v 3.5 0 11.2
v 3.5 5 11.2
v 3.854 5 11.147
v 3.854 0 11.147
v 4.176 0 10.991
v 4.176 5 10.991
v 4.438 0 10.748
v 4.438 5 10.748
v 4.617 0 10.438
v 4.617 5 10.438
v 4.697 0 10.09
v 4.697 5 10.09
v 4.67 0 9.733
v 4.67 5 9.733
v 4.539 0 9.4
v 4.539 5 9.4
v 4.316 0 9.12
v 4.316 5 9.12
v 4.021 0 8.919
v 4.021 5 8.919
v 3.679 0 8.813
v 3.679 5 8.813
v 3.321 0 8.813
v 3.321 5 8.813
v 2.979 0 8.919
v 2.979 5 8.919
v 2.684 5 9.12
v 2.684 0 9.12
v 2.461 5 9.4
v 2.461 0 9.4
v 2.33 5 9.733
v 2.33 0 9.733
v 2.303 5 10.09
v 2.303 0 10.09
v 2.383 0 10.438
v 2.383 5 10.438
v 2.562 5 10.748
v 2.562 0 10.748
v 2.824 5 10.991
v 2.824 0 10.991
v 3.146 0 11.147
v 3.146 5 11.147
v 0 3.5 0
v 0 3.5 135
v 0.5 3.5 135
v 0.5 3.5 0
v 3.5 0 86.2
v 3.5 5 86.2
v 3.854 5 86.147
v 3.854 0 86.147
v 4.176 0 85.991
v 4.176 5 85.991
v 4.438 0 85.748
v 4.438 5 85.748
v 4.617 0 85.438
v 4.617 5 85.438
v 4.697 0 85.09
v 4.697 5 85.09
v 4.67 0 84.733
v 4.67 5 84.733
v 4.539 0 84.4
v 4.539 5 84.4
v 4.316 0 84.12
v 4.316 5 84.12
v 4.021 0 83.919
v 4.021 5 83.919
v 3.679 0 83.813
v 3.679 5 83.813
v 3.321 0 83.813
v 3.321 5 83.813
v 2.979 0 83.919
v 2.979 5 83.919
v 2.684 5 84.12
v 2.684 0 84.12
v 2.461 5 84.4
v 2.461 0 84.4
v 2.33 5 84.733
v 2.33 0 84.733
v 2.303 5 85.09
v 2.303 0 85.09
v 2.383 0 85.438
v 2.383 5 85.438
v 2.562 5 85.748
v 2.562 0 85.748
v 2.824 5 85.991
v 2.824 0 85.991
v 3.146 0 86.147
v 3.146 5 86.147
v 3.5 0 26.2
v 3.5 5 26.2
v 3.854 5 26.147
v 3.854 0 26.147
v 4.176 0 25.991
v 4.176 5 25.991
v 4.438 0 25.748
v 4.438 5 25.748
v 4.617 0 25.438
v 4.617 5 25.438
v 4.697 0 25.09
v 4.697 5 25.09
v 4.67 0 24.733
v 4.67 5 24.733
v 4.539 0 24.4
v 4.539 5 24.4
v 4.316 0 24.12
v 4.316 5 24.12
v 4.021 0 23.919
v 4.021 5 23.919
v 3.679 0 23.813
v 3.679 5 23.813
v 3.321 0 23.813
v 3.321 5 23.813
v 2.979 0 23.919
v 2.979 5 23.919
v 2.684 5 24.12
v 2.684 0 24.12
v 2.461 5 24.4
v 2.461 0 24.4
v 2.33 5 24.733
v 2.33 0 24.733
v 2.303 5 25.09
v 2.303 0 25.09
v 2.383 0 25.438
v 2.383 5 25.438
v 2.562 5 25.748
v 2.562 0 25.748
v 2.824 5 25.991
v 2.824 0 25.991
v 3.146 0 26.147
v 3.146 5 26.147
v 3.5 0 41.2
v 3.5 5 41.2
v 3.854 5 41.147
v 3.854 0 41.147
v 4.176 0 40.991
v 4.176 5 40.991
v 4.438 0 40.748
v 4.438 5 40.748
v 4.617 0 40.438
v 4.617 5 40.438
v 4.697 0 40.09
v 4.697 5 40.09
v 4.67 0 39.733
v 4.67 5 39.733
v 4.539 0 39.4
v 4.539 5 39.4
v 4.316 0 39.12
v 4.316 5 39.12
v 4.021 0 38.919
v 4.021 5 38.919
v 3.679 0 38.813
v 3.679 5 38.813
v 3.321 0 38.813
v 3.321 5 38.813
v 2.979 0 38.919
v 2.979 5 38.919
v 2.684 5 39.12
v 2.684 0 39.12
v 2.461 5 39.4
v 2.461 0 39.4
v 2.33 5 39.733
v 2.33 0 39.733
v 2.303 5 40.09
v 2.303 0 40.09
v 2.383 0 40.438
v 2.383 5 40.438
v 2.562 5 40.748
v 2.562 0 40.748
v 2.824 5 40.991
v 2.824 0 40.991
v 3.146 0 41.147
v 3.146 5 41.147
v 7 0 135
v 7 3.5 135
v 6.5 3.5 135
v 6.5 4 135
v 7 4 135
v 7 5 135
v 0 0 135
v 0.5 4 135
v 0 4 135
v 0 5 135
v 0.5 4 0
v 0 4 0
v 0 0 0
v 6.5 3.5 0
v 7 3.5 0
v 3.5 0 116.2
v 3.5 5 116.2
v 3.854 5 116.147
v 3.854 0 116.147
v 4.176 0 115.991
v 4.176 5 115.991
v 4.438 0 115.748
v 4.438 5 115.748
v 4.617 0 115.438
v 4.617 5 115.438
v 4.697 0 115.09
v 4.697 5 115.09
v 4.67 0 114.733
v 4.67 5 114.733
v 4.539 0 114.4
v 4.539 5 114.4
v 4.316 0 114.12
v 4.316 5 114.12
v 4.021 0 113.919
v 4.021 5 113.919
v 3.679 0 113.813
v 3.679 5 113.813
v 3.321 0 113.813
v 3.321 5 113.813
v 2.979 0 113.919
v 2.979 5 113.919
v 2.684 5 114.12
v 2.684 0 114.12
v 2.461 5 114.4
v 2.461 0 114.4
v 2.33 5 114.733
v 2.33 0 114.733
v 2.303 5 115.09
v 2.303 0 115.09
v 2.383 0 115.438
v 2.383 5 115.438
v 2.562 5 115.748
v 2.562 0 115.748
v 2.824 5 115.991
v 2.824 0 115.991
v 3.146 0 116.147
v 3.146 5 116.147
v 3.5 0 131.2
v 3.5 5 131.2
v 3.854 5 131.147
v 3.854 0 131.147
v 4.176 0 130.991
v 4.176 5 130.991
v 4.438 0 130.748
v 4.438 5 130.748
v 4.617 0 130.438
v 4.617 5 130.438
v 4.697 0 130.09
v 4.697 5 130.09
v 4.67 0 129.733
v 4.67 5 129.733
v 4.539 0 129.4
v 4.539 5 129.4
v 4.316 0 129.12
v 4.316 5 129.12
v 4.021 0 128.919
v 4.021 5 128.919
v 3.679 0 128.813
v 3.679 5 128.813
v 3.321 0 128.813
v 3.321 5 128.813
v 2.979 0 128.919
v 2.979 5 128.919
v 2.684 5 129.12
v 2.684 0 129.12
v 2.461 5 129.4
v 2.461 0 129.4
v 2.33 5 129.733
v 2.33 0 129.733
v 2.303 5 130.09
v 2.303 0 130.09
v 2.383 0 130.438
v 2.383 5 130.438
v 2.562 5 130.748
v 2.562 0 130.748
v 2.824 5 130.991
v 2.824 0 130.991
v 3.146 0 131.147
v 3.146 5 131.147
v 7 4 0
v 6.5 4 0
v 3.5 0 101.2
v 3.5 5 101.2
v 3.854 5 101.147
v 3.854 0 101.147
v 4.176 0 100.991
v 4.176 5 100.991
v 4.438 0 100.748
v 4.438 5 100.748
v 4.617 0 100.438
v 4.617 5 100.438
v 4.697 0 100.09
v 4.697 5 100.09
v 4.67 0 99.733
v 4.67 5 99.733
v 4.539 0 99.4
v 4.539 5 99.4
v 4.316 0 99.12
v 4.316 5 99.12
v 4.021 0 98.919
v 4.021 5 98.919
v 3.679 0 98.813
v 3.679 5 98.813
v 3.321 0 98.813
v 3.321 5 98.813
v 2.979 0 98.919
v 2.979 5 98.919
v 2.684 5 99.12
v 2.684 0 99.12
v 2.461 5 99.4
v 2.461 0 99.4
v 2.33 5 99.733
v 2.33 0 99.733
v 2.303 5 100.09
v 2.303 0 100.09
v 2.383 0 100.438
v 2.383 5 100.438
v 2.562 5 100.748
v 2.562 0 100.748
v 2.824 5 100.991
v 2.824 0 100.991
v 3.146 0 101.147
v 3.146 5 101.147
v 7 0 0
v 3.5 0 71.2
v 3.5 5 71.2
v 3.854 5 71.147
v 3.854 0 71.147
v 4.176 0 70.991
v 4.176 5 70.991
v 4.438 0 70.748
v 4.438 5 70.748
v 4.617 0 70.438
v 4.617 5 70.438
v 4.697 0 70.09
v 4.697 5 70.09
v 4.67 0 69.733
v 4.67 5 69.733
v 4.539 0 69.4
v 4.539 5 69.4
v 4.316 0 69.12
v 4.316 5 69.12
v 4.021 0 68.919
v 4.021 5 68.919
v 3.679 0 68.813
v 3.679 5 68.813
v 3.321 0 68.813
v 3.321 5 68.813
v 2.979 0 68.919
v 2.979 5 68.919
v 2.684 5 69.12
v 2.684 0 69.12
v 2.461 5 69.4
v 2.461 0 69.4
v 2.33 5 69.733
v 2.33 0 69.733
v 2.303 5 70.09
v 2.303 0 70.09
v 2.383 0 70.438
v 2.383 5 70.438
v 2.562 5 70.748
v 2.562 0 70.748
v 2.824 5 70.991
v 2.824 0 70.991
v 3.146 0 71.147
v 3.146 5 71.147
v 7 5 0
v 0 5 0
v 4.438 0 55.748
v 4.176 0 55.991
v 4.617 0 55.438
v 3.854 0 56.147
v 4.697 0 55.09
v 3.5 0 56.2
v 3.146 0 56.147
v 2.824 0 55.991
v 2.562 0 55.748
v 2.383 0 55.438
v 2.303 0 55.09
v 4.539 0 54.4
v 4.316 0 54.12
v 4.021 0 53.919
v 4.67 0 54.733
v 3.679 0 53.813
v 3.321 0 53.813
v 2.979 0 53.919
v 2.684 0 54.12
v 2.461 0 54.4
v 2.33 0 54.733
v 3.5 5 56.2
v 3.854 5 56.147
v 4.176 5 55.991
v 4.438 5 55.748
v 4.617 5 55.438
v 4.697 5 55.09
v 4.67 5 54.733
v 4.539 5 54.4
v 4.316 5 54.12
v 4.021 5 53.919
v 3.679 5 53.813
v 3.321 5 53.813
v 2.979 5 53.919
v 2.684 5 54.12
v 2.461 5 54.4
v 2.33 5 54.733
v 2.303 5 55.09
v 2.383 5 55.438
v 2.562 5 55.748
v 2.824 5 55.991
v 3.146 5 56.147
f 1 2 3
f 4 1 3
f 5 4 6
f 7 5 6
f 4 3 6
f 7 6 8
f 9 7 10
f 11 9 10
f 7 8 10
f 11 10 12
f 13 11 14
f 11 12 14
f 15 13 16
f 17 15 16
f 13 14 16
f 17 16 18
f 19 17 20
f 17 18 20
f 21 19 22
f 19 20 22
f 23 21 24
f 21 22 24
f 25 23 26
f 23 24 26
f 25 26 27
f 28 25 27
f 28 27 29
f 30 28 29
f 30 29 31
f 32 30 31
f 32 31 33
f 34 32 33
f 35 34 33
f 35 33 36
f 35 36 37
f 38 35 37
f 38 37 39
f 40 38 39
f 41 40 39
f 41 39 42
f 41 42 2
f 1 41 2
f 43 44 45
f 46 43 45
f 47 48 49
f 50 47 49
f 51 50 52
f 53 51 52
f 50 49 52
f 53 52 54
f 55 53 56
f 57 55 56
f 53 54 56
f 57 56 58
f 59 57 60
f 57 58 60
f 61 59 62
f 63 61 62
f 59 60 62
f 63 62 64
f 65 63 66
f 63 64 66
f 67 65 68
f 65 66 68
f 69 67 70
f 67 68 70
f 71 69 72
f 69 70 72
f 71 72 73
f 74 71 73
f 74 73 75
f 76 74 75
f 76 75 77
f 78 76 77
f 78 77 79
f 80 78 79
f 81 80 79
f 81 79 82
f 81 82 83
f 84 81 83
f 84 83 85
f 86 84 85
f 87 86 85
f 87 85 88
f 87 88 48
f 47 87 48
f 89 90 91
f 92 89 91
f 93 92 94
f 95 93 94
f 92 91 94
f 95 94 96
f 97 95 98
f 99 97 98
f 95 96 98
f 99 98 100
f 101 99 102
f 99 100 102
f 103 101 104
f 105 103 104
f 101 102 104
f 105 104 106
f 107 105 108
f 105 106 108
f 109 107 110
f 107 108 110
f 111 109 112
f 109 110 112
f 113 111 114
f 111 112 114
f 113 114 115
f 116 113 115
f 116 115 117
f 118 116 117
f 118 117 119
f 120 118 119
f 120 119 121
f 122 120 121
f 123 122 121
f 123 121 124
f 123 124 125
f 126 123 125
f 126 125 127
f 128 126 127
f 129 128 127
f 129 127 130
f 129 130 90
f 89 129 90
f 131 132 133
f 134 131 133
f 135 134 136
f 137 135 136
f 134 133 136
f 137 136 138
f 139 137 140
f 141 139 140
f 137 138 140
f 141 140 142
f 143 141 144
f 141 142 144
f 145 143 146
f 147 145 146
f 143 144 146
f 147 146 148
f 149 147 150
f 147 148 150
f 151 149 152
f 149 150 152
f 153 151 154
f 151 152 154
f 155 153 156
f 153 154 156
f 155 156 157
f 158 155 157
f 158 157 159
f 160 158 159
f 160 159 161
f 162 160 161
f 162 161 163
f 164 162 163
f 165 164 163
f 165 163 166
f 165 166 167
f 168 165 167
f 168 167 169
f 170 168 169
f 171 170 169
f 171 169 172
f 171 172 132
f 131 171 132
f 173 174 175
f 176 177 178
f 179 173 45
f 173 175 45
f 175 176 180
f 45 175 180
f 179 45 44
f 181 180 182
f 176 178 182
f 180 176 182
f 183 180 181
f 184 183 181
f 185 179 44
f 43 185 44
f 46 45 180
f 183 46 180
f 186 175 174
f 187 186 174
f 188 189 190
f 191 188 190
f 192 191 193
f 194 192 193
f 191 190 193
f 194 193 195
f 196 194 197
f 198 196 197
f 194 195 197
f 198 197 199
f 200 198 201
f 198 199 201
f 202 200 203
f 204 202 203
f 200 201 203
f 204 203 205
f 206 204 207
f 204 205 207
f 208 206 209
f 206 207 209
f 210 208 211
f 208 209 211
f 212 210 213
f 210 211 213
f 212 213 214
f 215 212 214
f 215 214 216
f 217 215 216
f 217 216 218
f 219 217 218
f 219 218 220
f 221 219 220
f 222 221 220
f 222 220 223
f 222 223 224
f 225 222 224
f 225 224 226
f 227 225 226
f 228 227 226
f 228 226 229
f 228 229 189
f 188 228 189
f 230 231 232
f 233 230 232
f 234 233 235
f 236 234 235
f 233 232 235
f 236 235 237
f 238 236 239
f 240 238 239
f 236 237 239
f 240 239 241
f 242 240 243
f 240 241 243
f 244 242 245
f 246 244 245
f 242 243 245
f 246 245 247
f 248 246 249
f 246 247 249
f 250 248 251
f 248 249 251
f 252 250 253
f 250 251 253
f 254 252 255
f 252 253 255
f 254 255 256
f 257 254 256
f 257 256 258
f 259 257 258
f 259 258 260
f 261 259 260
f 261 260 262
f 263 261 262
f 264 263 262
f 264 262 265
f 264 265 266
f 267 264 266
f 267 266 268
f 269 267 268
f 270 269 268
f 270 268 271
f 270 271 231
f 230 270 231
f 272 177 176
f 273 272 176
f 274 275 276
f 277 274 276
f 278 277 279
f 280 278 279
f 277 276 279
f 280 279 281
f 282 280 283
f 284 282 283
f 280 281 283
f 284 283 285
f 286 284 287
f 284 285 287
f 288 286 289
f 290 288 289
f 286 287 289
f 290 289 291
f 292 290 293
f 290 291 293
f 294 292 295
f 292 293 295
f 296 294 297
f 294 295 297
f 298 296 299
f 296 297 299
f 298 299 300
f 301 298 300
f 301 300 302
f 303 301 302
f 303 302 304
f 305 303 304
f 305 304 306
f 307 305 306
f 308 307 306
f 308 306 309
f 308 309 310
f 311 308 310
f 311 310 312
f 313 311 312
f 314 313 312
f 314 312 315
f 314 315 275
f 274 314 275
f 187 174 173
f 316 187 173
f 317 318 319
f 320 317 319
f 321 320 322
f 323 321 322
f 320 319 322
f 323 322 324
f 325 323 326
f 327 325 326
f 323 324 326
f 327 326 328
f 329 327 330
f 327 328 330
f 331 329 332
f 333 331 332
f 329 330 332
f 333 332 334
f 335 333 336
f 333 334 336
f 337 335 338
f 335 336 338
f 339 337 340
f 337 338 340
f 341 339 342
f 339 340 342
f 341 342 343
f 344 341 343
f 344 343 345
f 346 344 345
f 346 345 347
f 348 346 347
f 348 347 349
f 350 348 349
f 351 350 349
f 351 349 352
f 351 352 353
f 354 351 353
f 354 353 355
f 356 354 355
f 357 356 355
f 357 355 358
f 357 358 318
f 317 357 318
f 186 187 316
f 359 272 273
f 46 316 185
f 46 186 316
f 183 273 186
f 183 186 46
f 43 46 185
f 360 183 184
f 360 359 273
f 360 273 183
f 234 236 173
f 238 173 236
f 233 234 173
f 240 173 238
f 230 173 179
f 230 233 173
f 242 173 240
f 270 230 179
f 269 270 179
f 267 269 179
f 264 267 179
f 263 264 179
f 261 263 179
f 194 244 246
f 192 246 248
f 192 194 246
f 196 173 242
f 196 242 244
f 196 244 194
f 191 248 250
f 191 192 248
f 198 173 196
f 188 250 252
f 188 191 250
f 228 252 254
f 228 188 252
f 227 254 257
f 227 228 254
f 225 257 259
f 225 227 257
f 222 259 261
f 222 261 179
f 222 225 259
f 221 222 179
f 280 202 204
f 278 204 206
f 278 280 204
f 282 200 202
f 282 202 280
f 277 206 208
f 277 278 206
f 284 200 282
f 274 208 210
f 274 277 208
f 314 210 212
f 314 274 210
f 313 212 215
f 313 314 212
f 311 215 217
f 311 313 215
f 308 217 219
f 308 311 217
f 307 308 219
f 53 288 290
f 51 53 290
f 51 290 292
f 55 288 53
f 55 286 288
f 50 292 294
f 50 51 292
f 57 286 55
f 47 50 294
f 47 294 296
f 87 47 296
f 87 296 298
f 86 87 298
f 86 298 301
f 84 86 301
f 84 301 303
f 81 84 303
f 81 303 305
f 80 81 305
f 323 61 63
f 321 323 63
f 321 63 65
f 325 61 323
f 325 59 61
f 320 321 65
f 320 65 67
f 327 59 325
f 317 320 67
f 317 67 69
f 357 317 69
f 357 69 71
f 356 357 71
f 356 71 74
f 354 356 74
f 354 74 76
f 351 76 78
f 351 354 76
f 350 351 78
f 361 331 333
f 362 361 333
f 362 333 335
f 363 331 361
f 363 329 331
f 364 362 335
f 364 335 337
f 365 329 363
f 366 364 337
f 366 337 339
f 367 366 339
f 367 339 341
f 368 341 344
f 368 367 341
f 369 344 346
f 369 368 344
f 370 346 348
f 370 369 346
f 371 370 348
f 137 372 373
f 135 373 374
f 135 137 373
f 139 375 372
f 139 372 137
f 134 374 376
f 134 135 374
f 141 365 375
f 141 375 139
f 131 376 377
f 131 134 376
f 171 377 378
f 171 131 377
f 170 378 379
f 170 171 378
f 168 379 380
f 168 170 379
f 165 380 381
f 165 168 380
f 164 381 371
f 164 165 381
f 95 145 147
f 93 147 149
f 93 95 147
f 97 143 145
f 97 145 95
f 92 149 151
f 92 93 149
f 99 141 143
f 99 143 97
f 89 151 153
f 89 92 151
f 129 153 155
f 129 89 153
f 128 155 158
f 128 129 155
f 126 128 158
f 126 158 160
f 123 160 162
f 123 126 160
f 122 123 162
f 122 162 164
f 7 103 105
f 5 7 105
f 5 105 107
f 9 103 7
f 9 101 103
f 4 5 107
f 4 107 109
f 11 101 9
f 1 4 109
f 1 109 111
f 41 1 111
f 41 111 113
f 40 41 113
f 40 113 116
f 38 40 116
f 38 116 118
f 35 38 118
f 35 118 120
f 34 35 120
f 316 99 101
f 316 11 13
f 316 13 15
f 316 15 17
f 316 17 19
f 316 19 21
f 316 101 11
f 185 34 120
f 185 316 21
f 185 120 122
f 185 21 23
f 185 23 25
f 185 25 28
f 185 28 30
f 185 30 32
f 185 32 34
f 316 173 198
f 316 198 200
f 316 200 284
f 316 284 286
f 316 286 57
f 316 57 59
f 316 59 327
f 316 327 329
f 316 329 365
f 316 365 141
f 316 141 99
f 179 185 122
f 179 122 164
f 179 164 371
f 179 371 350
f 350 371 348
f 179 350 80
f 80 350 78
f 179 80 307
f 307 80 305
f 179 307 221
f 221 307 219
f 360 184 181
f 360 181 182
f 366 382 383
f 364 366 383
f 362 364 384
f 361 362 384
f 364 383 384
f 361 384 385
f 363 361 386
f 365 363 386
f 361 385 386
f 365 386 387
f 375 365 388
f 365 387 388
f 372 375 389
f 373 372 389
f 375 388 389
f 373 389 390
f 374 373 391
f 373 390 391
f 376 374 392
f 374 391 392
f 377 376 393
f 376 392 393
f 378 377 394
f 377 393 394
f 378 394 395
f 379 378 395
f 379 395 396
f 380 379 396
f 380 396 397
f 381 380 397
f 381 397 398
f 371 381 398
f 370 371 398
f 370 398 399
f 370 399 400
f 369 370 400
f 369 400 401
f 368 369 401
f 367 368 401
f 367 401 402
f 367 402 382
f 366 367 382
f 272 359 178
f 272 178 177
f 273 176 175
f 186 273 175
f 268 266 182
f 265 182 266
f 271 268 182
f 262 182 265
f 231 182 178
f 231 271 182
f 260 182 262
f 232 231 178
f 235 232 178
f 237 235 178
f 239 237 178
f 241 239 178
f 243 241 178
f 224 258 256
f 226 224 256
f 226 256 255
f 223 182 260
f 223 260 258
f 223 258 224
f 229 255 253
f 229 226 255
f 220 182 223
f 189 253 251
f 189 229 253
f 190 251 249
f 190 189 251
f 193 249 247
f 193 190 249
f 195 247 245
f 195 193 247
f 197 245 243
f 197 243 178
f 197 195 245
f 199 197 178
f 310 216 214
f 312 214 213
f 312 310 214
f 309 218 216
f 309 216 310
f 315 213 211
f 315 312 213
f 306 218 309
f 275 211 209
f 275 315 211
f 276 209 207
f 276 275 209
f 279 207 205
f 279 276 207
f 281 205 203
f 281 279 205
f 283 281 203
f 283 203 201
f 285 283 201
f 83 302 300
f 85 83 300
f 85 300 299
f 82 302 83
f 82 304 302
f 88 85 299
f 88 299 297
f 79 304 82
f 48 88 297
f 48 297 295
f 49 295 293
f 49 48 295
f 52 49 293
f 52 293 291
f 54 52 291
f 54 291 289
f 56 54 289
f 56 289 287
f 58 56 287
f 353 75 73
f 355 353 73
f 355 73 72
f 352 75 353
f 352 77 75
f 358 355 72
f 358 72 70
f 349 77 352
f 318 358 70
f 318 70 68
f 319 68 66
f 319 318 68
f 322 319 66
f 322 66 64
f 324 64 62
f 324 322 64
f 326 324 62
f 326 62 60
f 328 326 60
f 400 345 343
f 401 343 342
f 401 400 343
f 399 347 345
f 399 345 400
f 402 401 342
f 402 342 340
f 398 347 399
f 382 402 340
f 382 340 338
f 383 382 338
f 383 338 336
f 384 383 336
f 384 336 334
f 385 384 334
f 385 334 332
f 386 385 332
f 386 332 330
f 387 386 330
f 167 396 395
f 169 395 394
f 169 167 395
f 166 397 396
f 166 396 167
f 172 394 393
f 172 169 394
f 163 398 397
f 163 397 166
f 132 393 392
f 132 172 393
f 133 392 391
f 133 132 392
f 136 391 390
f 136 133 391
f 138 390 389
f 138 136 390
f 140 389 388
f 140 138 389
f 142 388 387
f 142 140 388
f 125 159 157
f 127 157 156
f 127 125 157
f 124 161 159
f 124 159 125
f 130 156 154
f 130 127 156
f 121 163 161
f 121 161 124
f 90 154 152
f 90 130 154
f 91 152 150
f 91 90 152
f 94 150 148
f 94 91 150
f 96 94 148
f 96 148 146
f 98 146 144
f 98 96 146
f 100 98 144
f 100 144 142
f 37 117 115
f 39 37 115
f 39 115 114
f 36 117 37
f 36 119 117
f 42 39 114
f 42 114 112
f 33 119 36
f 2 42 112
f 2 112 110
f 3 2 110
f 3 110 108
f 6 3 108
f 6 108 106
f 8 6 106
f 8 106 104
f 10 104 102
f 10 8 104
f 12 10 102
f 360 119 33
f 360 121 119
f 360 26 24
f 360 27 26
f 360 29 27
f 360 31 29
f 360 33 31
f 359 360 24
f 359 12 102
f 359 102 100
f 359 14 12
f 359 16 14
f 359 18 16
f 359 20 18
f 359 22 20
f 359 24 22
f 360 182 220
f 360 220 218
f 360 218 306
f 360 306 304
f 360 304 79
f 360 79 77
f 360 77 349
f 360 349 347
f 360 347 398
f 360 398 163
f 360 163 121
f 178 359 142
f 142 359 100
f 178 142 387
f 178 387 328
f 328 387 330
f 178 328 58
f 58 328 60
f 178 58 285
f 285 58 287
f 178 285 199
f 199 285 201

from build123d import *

# Parameters (mm, degrees)
BOSS_EXTRUDE1_DEPTH = 135
SKETCH2_R           = 1.2
CUT_EXTRUDE1_DEPTH  = 136.273796428


with BuildPart() as part:
    # Sketch1 → Boss-Extrude1 (new body)
    with BuildSketch(Plane.XY):
        Polygon((0, 4), (0, 5), (7, 5), (7, 4), (6.5, 4), (6.5, 3.5), (7, 3.5), (7, 0), (0, 0), (0, 3.5), (0.5, 3.5), (0.5, 4), align=None)
    extrude(amount=BOSS_EXTRUDE1_DEPTH)

    # Sketch2 → Cut-Extrude1 (cut, through all)
    with BuildSketch(Plane(origin=(0, 5, 0), x_dir=(1, 0, 0), z_dir=(0, 1, 0))):
        with Locations(Location((3.5, -130, 0), (0, 0, 270))):
            Circle(SKETCH2_R)
        with Locations(Location((3.5, -115, 0), (0, 0, 270))):
            Circle(SKETCH2_R)
        with Locations(Location((3.5, -100, 0), (0, 0, 270))):
            Circle(SKETCH2_R)
        with Locations(Location((3.5, -85, 0), (0, 0, 270))):
            Circle(SKETCH2_R)
        with Locations(Location((3.5, -70, 0), (0, 0, 270))):
            Circle(SKETCH2_R)
        with Locations(Location((3.5, -55, 0), (0, 0, 270))):
            Circle(SKETCH2_R)
        with Locations(Location((3.5, -40, 0), (0, 0, 270))):
            Circle(SKETCH2_R)
        with Locations(Location((3.5, -25, 0), (0, 0, 270))):
            Circle(SKETCH2_R)
        with Locations(Location((3.5, -10, 0), (0, 0, 270))):
            Circle(SKETCH2_R)
        with Locations((3.5, 5)):
            Circle(SKETCH2_R)
        with Locations((3.5, 20)):
            Circle(SKETCH2_R)
        with Locations((3.5, 35)):
            Circle(SKETCH2_R)
        with Locations((3.5, 50)):
            Circle(SKETCH2_R)
    extrude(amount=-CUT_EXTRUDE1_DEPTH, mode=Mode.SUBTRACT)


solid = part.part
